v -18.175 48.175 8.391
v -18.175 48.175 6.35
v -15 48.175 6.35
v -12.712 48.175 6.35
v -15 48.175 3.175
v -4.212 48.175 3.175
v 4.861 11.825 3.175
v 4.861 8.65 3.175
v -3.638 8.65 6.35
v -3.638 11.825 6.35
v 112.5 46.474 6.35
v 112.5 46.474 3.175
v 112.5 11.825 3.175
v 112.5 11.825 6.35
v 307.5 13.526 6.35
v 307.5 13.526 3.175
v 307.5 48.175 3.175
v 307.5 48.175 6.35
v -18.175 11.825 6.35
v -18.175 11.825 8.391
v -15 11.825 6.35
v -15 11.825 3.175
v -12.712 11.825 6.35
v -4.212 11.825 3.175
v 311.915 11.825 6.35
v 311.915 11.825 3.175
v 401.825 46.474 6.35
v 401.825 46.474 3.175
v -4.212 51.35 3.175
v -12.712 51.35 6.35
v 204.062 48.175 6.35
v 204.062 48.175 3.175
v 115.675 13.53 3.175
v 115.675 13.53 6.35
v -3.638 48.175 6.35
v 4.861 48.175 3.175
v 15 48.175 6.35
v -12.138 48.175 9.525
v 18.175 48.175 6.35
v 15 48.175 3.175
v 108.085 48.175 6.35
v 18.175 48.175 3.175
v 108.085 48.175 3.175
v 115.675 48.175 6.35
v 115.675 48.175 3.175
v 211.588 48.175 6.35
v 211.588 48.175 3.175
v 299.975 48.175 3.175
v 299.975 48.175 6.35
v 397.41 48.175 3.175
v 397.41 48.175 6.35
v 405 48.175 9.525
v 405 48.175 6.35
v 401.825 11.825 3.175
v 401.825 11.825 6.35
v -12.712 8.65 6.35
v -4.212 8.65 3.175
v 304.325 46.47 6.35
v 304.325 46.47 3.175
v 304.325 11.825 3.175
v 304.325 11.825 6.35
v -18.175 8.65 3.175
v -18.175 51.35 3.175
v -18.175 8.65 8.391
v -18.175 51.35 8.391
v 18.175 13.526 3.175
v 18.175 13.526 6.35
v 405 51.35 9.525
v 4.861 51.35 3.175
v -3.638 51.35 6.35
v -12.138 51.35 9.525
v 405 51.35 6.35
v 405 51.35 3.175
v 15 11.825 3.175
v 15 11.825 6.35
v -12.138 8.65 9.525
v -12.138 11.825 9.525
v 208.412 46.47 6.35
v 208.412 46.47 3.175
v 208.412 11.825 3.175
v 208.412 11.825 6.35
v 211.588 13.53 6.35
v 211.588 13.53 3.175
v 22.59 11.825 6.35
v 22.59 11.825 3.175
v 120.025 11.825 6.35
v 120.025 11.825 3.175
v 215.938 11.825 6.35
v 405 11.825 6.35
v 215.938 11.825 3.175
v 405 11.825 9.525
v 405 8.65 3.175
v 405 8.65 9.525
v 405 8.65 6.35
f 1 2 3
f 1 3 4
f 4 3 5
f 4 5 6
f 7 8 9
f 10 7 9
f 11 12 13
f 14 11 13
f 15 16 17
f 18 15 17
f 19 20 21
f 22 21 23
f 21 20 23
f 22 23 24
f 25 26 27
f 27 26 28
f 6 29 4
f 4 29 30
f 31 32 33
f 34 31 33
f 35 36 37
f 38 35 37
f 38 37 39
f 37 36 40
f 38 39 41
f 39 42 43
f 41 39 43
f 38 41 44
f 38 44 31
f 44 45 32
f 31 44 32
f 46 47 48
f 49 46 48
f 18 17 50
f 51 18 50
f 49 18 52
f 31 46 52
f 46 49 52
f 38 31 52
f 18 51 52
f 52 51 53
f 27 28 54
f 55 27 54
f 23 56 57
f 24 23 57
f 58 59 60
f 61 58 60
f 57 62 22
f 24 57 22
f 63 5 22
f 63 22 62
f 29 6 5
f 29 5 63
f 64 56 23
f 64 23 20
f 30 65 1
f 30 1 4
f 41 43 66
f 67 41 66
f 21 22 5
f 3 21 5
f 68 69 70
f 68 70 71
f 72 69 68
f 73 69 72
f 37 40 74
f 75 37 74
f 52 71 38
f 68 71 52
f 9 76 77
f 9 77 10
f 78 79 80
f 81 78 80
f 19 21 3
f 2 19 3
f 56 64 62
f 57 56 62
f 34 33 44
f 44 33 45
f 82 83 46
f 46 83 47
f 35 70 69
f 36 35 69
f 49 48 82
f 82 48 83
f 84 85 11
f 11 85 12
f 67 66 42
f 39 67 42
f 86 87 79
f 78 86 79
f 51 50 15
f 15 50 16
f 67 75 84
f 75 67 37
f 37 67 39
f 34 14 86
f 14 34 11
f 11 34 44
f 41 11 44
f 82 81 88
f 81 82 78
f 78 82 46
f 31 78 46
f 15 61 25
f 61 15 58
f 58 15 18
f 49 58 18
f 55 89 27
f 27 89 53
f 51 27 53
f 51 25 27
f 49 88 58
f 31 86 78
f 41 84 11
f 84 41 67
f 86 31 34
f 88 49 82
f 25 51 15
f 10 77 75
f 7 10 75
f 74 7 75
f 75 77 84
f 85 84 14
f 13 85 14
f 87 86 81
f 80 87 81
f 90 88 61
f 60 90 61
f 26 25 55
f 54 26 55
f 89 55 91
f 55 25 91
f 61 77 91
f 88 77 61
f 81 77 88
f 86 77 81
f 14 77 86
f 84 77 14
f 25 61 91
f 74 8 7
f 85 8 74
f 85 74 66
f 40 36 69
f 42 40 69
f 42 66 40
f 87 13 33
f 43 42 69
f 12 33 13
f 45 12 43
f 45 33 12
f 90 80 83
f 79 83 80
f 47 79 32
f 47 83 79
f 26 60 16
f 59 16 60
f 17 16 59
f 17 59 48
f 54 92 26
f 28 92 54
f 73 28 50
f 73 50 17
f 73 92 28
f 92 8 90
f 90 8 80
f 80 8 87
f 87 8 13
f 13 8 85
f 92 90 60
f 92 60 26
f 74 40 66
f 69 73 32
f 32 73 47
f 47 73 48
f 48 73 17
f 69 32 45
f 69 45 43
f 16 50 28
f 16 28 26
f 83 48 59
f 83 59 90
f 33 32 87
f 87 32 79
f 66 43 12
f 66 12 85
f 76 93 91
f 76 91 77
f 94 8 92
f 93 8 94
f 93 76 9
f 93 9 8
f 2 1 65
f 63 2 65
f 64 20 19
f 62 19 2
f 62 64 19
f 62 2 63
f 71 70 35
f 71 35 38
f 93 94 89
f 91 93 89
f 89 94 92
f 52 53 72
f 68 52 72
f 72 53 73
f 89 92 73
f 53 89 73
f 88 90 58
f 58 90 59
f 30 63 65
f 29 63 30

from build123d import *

# Parameters (mm, degrees)
BOSS_EXTRUDE1_DEPTH   = 3.175
BOSS_EXTRUDE1_2_DEPTH = 3.175
SKETCH2_W             = 3.175
SKETCH2_H             = 36.35
BOSS_EXTRUDE2_DEPTH   = 3.175
SKETCH3_W             = 3.175
SKETCH3_H             = 3.175
BOSS_EXTRUDE8_DEPTH   = 423.175
BOSS_EXTRUDE8_2_DEPTH = 423.175
SKETCH4_W             = 3.175
SKETCH4_H             = 36.35
CUT_EXTRUDE1_DEPTH    = 427.326430831
CUT_EXTRUDE7_DEPTH    = 3.175
CUT_EXTRUDE8_DEPTH    = 3.175
SKETCH10_W            = 408.638332101
SKETCH10_H            = 3.175
BOSS_EXTRUDE9_DEPTH   = 3.175
BOSS_EXTRUDE10_DEPTH  = 3.175
BOSS_EXTRUDE11_DEPTH  = 3.175


with BuildPart() as part:
    # Sketch1 → Boss-Extrude1 (new body)
    with BuildSketch(Plane.XY):
        Polygon((15, 45), (405, 45), (405, 48.175), (18.175, 48.175), (-18.175, 48.175), (-18.175, 45), (-15, 45), align=None)
    extrude(amount=BOSS_EXTRUDE1_DEPTH)



with BuildPart() as body_2:
    # Sketch1 → Boss-Extrude1 2 (new body)
    with BuildSketch(Plane.XY):
        Polygon((-18.175, 15), (-15, 15), (15, 15), (405, 15), (405, 11.825), (18.175, 11.825), (-18.175, 11.825), align=None)
    extrude(amount=BOSS_EXTRUDE1_2_DEPTH)


with BuildPart() as part_1:
    add(part.part)

    add(body_2.part)  # Boss-Extrude2 merges body 2
    # Sketch2 → Boss-Extrude2 (add)
    with BuildSketch(Plane.XY.offset(3.175)):
        with Locations((-16.5875, 30)):
            Rectangle(SKETCH2_W, SKETCH2_H)
        Polygon((15, 11.825), (22.589723325, 11.825), (112.5, 46.473699254), (112.5, 12.285600704), (112.5, 11.825), (120.025102002, 11.825), (208.4125, 46.469905429), (208.4125, 11.825), (215.937602002, 11.825), (304.325, 46.469905429), (304.325, 11.825), (311.914723325, 11.825), (401.825, 46.473699254), (401.825, 11.825), (405, 11.825), (405, 48.175), (397.410276675, 48.175), (307.5, 13.526300746), (307.5, 48.175), (299.974897998, 48.175), (211.5875, 13.530094571), (211.5875, 48.175), (204.062397998, 48.175), (115.675, 13.530094571), (115.675, 48.175), (108.085276675, 48.175), (18.175, 13.526300746), (18.175, 48.175), (15, 48.175), align=None)
    extrude(amount=BOSS_EXTRUDE2_DEPTH)

    # Sketch4 → Cut-Extrude1 (cut, through all)
    with BuildSketch(Plane(origin=(405, 0, 0), x_dir=(0, 0, -1), z_dir=(1, 0, 0))):
        with Locations((-1.5875, 30)):
            Rectangle(SKETCH4_W, SKETCH4_H)
    extrude(amount=-CUT_EXTRUDE1_DEPTH, mode=Mode.SUBTRACT)


with BuildPart() as body_2_2:
    # Sketch3 → Boss-Extrude8 (new body)
    with BuildSketch(Plane(origin=(405, 0, 0), x_dir=(0, 0, -1), z_dir=(1, 0, 0))):
        with Locations((-4.7625, 49.7625)):
            Rectangle(SKETCH3_W, SKETCH3_H)
    extrude(amount=-BOSS_EXTRUDE8_DEPTH)

    # Sketch9 → Cut-Extrude8 (cut)
    with BuildSketch(Plane(origin=(0, 51.35, 0), x_dir=(1, 0, 0), z_dir=(0, 1, 0))):
        Polygon((-3.638332101, -6.35), (4.861361865, -3.175), (-4.211973934, -3.175), (-12.711667899, -6.35), align=None)
    extrude(amount=-CUT_EXTRUDE8_DEPTH, mode=Mode.SUBTRACT)


with BuildPart() as body_3:
    # Sketch3 → Boss-Extrude8 2 (new body)
    with BuildSketch(Plane(origin=(405, 0, 0), x_dir=(0, 0, -1), z_dir=(1, 0, 0))):
        with Locations((-4.7625, 10.2375)):
            Rectangle(SKETCH3_W, SKETCH3_H)
    extrude(amount=-BOSS_EXTRUDE8_2_DEPTH)

    # Sketch5 → Cut-Extrude7 (cut)
    with BuildSketch(Plane.XZ.offset(-8.65)):
        Polygon((-4.211973934, 3.175), (4.861361865, 3.175), (-3.638332101, 6.35), (-12.711667899, 6.35), align=None)
    extrude(amount=-CUT_EXTRUDE7_DEPTH, mode=Mode.SUBTRACT)


with BuildPart() as cut_extrude1_piece_1:
    # of the separate pieces the step leaves, piece 1, a body of its own (cut_extrude1_pieces)
    add(part_1.part.solids().sort_by_distance((401.825, 11.825, 3.175))[0])



with BuildPart() as cut_extrude1_piece_2:
    # of the separate pieces the step leaves, piece 2, a body of its own (cut_extrude1_pieces)
    add(part_1.part.solids().sort_by_distance((-15, 48.175, 3.175))[0])


with BuildPart() as cut_extrude7_piece_1:
    # of the separate pieces the step leaves, piece 1, a body of its own (cut_extrude7_pieces)
    add(body_3.part.solids().sort_by_distance((405, 11.825, 3.175))[0])


with BuildPart() as cut_extrude7_piece_2:
    # of the separate pieces the step leaves, piece 2, a body of its own (cut_extrude7_pieces)
    add(body_3.part.solids().sort_by_distance((-12.711667899, 11.825, 6.35))[0])


with BuildPart() as cut_extrude8_piece_1:
    # of the separate pieces the step leaves, piece 1, a body of its own (cut_extrude8_pieces)
    add(body_2_2.part.solids().sort_by_distance((405, 51.35, 6.35))[0])


with BuildPart() as cut_extrude8_piece_2:
    # of the separate pieces the step leaves, piece 2, a body of its own (cut_extrude8_pieces)
    add(body_2_2.part.solids().sort_by_distance((-12.711667899, 51.35, 6.35))[0])


with BuildPart() as cut_extrude1_piece_1_1:
    add(cut_extrude1_piece_1.part)

    add(cut_extrude7_piece_1.part)  # Boss-Extrude9 merges Cut-Extrude7 piece 1

    add(cut_extrude8_piece_1.part)  # Boss-Extrude9 merges Cut-Extrude8 piece 1
    # Sketch10 → Boss-Extrude9 (add)
    with BuildSketch(Plane.XY.offset(6.35)):
        with Locations((200.680833949, 49.7625)):
            Rectangle(SKETCH10_W, SKETCH10_H)
        with Locations((200.680833949, 10.2375)):
            Rectangle(SKETCH10_W, SKETCH10_H)
    extrude(amount=BOSS_EXTRUDE9_DEPTH)


    add(cut_extrude1_piece_2.part)  # Boss-Extrude10 merges Cut-Extrude1 piece 2

    add(cut_extrude8_piece_2.part)  # Boss-Extrude10 merges Cut-Extrude8 piece 2
    # Sketch11 → Boss-Extrude10 (add)
    with BuildSketch(Plane(origin=(0, 51.35, 0), x_dir=(1, 0, 0), z_dir=(0, 1, 0))):
        Polygon((-18.175, -8.390788703), (-12.711667899, -6.35), (-18.175, -6.35), align=None)
        Polygon((405, -6.35), (-3.638332101, -6.35), (-12.138026066, -9.525), (405, -9.525), align=None)
    extrude(amount=-BOSS_EXTRUDE10_DEPTH)


    add(cut_extrude7_piece_2.part)  # Boss-Extrude11 merges Cut-Extrude7 piece 2
    # Sketch12 → Boss-Extrude11 (add)
    with BuildSketch(Plane.XZ.offset(-8.65)):
        Polygon((-3.638332101, 9.525), (-12.138026066, 9.525), (-3.638332101, 6.35), align=None)
        Polygon((-12.711667899, 6.35), (-18.175, 8.390788703), (-18.175, 6.35), align=None)
    extrude(amount=-BOSS_EXTRUDE11_DEPTH)


solid = cut_extrude1_piece_1_1.part
